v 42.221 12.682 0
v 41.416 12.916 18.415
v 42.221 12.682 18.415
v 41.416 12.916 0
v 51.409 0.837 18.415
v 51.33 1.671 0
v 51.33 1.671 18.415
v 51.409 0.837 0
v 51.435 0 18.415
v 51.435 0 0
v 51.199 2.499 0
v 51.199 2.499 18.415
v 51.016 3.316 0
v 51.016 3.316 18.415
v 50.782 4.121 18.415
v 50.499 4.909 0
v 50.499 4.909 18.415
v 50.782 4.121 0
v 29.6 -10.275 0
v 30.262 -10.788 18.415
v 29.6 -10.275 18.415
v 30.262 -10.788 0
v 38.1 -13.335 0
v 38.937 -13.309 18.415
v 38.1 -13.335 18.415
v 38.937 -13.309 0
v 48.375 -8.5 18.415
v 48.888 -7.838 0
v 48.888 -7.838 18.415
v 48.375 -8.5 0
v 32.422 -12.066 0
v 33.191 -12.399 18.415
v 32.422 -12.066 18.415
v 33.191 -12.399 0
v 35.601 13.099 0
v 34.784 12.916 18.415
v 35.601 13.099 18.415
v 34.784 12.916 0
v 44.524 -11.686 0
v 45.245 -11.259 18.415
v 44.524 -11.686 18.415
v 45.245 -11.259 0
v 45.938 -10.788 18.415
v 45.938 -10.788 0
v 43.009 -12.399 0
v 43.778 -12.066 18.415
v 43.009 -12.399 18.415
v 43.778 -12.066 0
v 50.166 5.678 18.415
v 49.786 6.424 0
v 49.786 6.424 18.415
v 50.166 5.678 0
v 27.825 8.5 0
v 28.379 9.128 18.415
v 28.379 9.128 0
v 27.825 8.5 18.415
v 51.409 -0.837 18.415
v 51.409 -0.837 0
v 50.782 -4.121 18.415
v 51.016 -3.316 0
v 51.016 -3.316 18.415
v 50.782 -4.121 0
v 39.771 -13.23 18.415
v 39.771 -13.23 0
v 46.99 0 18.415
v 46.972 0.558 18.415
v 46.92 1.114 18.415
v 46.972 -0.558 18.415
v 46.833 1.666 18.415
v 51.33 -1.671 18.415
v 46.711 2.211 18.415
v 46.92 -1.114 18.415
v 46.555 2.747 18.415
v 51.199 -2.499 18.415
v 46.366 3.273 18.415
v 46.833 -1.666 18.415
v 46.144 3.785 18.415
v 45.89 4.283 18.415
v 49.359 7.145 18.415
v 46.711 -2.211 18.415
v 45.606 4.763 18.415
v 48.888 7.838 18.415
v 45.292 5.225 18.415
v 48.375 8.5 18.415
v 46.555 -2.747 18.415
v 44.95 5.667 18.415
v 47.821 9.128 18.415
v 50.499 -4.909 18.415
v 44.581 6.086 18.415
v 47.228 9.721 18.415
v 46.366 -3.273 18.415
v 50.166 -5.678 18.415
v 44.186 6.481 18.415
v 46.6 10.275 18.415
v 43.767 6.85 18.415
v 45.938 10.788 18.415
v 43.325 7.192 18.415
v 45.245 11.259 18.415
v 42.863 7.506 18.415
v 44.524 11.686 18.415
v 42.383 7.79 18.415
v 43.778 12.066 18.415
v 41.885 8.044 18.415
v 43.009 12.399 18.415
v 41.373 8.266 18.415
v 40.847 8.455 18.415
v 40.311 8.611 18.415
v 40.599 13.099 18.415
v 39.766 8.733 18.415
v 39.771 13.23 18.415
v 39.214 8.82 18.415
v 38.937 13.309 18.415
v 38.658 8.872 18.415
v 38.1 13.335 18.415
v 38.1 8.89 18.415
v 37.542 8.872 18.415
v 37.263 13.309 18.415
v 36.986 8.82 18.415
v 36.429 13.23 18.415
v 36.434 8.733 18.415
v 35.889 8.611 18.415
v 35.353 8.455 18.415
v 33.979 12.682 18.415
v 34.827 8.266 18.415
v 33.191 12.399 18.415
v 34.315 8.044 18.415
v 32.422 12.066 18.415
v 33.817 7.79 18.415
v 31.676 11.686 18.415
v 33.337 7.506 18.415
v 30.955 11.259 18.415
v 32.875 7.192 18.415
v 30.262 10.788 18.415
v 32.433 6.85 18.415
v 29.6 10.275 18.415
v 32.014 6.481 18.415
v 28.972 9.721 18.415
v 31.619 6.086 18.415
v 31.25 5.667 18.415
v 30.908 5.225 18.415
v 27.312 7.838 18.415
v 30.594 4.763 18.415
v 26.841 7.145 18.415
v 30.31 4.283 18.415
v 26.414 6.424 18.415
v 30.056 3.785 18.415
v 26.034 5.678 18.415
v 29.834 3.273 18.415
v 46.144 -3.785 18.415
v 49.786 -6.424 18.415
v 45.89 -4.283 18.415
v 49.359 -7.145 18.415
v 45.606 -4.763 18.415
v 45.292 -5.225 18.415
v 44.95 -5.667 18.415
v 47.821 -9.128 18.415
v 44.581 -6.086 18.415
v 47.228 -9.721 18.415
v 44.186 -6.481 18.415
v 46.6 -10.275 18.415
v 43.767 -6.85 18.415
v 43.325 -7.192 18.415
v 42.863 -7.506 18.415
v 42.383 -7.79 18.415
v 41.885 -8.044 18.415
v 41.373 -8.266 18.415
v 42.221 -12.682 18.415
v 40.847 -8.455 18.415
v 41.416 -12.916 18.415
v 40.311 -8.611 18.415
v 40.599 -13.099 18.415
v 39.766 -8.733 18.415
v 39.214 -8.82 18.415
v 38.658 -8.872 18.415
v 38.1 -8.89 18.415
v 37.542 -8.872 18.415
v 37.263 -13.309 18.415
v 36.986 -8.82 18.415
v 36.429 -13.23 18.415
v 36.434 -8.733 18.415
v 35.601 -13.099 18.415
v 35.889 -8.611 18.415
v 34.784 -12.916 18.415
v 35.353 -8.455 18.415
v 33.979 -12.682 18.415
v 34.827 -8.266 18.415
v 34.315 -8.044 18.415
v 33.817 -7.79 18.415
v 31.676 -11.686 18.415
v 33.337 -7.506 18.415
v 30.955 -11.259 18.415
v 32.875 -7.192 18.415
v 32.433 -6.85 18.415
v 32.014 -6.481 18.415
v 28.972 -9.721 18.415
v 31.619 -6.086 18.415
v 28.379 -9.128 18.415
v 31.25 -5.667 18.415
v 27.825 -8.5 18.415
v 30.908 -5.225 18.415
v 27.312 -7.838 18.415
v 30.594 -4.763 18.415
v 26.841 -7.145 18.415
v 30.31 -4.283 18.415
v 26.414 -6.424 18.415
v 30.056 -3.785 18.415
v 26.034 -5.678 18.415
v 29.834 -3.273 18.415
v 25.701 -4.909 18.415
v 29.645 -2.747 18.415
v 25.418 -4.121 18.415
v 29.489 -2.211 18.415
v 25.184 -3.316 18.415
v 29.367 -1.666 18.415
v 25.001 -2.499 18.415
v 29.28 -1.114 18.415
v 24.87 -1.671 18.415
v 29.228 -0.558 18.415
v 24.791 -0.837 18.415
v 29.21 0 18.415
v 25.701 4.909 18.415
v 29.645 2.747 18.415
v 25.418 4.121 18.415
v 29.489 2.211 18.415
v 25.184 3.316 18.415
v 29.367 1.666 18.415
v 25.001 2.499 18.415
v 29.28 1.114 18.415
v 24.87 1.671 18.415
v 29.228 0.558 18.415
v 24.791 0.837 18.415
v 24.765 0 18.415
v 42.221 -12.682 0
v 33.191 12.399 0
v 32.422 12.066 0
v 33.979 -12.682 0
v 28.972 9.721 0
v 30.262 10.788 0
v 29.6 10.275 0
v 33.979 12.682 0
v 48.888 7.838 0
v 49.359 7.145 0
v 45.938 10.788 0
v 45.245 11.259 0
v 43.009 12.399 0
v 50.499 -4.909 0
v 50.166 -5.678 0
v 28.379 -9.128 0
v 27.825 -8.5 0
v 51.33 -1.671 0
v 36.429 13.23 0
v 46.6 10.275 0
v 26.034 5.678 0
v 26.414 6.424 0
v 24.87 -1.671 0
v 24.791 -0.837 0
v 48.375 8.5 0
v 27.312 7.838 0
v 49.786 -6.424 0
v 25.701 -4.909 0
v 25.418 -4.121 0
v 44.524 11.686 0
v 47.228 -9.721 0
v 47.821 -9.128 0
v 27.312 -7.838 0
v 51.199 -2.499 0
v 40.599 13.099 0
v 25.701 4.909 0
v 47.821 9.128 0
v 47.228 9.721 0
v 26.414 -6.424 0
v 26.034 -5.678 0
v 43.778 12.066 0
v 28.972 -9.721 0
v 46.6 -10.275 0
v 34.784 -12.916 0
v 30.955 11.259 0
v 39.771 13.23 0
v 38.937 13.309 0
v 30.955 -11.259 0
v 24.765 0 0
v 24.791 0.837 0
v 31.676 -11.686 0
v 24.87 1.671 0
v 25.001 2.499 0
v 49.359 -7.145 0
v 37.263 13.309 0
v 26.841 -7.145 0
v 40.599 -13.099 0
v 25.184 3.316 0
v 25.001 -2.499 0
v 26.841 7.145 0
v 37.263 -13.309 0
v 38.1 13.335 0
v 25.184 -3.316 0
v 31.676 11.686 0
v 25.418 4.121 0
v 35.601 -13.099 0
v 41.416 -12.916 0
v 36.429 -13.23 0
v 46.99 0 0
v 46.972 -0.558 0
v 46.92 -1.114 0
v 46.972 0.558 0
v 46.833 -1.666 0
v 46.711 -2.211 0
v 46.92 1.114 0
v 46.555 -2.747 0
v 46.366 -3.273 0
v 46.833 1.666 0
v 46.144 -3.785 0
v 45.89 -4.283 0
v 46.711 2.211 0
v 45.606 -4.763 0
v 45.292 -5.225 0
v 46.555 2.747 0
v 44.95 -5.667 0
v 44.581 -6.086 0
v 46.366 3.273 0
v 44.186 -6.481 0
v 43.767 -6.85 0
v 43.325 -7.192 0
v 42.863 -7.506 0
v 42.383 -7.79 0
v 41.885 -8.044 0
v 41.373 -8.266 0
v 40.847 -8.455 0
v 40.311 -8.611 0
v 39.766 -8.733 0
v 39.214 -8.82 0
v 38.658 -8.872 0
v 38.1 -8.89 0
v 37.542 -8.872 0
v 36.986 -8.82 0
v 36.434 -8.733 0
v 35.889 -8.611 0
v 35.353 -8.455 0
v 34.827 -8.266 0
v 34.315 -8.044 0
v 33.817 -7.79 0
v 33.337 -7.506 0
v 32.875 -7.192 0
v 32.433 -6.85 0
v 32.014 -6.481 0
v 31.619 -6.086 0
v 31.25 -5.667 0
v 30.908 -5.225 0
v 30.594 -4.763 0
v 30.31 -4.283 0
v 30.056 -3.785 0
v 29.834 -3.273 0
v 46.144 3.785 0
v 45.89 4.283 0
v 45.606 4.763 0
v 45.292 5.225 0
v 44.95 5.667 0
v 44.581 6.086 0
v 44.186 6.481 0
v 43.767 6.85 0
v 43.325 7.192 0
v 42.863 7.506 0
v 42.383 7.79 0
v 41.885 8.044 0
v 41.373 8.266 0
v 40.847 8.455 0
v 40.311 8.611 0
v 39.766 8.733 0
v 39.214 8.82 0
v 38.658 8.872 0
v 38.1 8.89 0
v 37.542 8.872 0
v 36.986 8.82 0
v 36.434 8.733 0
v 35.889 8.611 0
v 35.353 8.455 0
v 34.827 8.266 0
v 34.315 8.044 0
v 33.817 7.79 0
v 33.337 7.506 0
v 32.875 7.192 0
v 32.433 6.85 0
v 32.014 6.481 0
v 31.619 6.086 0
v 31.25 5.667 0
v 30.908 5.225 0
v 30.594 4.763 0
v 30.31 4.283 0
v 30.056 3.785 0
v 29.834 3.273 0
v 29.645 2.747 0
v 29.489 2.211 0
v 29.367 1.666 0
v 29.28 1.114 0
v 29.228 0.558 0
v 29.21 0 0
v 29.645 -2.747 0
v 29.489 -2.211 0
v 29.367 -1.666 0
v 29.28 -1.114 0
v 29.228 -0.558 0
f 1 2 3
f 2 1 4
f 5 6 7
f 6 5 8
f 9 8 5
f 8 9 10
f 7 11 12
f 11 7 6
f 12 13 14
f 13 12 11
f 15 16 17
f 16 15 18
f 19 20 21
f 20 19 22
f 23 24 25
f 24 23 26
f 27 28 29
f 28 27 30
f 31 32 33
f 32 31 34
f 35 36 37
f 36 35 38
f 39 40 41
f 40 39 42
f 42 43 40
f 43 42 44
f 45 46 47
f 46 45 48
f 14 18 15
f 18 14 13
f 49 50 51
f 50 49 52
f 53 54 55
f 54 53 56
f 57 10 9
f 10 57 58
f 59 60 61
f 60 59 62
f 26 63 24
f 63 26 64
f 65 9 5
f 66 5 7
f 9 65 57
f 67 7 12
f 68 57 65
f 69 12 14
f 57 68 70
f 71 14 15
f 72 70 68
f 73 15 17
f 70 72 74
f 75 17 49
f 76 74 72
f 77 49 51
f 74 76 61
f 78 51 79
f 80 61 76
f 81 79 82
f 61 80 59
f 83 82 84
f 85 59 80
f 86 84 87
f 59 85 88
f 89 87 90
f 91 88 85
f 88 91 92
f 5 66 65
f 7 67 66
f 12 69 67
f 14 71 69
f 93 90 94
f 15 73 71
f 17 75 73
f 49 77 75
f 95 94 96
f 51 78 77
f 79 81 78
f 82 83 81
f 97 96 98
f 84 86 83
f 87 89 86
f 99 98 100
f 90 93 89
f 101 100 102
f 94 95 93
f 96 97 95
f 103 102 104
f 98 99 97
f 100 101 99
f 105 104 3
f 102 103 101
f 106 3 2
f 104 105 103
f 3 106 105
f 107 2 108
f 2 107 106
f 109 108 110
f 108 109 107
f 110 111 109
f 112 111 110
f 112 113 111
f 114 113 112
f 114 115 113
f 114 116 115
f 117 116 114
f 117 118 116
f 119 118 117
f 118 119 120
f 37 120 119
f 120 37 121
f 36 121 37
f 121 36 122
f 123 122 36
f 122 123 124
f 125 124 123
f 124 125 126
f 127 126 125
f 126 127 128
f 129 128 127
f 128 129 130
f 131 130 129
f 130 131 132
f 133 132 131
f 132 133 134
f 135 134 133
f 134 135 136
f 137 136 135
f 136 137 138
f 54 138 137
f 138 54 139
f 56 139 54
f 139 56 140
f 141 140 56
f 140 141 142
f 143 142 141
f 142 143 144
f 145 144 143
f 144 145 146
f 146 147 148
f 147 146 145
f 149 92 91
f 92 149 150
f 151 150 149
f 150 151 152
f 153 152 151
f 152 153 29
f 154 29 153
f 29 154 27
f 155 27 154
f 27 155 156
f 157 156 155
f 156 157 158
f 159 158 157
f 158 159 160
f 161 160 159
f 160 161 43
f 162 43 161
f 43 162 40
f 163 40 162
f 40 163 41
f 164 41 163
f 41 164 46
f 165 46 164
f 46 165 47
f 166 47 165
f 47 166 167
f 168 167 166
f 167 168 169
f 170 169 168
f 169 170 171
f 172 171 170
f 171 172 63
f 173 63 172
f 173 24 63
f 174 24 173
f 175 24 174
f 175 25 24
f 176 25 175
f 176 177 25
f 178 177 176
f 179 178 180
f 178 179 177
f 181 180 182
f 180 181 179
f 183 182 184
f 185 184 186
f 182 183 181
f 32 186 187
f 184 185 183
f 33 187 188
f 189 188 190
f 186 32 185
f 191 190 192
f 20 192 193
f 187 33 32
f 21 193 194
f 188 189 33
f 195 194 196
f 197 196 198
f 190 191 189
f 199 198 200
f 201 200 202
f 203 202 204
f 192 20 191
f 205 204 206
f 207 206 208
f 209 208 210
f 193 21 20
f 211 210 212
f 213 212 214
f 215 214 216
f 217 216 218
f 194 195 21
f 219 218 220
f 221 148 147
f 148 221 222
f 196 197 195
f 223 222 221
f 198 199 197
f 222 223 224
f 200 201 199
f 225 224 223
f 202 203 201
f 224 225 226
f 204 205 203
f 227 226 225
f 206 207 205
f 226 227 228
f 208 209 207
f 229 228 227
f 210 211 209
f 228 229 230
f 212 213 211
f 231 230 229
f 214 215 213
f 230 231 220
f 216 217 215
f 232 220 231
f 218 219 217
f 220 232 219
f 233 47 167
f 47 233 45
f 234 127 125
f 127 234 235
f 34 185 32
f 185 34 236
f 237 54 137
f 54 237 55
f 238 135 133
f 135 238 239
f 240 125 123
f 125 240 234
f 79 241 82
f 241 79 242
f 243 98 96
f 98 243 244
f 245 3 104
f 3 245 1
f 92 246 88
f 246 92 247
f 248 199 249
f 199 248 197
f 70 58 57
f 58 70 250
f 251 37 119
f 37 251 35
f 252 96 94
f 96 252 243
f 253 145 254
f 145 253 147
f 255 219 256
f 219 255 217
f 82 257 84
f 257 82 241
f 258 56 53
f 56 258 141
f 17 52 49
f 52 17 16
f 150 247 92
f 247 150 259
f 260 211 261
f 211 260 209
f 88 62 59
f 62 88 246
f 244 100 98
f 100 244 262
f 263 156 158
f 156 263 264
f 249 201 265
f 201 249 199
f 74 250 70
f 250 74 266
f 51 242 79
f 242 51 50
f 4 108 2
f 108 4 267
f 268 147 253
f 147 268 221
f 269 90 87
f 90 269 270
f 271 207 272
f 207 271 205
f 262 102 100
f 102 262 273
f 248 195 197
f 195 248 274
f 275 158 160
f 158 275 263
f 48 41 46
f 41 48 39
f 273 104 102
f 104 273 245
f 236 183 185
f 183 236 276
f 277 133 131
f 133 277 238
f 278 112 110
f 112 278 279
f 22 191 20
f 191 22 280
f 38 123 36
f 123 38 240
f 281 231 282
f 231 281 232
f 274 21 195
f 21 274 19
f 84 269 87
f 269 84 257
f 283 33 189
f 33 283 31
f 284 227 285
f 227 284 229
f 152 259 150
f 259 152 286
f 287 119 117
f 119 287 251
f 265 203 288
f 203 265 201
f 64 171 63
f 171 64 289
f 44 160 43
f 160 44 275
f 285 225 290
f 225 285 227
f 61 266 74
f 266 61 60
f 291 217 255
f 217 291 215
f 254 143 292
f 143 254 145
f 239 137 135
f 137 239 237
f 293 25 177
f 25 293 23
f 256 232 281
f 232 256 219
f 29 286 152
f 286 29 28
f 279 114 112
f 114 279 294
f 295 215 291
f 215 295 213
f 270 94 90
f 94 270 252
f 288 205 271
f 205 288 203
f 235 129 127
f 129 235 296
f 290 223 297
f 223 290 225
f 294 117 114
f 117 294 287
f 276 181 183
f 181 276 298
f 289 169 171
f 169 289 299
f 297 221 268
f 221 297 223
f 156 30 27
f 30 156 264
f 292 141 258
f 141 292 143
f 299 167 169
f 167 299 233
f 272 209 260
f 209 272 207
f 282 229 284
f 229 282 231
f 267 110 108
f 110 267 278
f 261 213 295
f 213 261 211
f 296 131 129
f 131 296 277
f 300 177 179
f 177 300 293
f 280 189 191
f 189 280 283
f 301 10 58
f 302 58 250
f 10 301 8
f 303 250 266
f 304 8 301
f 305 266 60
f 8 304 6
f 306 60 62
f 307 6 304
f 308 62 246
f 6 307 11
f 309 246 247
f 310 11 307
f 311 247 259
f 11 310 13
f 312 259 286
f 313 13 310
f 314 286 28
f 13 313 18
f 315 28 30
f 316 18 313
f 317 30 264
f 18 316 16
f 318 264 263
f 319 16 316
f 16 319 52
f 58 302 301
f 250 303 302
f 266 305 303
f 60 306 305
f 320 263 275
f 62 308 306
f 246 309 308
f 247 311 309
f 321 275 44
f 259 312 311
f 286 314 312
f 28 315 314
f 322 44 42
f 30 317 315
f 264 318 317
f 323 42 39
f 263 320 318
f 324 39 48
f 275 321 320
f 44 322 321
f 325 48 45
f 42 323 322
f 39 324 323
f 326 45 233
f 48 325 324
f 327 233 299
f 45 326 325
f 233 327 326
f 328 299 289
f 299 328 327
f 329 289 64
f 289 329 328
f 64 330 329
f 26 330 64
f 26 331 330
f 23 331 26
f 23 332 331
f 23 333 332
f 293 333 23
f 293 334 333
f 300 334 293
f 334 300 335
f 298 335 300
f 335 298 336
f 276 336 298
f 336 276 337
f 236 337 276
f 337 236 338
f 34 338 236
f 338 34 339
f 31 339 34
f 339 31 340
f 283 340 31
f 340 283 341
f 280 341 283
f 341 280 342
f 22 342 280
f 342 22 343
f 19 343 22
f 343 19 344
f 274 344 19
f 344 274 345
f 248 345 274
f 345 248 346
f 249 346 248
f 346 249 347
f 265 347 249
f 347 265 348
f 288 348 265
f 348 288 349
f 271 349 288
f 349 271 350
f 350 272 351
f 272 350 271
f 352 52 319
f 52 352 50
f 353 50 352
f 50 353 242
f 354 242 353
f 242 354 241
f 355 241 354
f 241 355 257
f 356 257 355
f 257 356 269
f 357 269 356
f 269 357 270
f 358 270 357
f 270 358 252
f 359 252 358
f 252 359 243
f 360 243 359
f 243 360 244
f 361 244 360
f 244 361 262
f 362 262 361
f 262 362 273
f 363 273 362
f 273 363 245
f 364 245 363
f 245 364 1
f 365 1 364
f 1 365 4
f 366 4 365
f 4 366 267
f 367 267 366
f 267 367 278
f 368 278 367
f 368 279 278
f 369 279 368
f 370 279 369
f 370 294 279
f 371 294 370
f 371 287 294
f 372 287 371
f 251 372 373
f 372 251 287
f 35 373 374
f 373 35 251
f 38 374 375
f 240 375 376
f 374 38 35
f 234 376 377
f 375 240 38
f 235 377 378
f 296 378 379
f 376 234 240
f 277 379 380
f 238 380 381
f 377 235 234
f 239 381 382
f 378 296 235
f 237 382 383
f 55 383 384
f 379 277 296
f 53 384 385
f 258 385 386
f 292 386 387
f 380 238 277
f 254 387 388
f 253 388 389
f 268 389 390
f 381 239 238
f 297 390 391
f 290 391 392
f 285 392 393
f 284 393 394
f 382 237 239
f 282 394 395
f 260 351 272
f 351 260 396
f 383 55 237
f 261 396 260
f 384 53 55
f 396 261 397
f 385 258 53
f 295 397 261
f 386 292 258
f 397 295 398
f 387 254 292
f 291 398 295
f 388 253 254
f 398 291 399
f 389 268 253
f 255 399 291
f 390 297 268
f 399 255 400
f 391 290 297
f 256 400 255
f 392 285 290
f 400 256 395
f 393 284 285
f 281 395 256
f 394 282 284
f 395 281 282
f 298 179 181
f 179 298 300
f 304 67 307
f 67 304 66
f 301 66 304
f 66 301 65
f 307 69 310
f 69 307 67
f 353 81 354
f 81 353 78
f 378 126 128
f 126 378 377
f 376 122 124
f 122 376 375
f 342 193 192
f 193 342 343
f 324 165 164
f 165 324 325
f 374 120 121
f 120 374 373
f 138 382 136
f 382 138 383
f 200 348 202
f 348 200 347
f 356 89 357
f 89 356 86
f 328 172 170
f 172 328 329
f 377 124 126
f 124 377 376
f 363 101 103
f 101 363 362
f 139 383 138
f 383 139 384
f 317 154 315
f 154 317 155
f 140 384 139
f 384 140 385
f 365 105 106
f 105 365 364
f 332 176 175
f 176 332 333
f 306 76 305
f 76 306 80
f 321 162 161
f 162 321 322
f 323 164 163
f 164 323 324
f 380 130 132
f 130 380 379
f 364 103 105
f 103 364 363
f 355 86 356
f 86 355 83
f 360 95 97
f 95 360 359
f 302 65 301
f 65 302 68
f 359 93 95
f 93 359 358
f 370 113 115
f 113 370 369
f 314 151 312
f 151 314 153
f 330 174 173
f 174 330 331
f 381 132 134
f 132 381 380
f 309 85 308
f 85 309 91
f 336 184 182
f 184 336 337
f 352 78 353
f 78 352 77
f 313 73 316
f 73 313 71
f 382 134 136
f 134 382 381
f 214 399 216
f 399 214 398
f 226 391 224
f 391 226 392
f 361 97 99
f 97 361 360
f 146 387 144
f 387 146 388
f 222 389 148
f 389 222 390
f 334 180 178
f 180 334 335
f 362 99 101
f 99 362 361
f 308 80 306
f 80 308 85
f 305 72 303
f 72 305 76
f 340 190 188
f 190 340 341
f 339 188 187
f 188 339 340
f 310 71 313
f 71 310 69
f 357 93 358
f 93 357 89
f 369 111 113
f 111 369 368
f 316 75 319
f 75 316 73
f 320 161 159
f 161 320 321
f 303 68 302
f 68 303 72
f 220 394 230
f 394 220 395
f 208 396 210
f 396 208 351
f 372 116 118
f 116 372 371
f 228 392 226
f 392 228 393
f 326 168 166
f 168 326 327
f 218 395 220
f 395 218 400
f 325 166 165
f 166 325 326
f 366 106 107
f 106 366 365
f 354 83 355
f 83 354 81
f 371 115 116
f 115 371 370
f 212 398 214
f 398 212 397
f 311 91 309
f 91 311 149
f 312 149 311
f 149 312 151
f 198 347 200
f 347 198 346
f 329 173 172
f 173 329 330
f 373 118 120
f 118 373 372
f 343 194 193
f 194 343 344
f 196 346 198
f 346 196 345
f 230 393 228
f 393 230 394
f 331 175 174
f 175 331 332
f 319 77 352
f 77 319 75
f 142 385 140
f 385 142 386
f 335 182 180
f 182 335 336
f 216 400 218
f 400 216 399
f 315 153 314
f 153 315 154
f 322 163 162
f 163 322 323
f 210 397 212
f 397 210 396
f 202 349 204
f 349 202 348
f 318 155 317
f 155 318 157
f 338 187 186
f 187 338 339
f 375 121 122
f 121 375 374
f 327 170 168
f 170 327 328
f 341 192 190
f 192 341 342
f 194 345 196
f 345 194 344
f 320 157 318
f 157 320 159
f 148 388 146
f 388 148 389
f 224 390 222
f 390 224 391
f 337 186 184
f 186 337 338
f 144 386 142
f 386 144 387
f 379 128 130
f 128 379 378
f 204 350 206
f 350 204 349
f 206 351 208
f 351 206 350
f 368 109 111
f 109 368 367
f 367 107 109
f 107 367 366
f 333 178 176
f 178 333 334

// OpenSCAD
include <tsmthread4.scad>

$fn=100;

od_3_4=1.05;

if(0)
imperial() {
    translate([0,0,.725]) {
    difference() {
        union() {
            thread_npt(DMAJ=od_3_4+$OD_COMP, PITCH=0.07143, L=0.07143*8);
        }
        
        cylinder(d=3/4, h=2);
    }

    translate([0,0,-.725]) 
    difference() {
        cylinder(d=od_3_4,h=.725);
        translate([0,0,-.01])
            cylinder(d=3/4,h=.725+.1);
    }
    }
}

flex_od=.7;
imperial() {
translate([1.5,0,0])
    difference() {
        cylinder(d=od_3_4,h=.725);
        translate([0,0,-.01])
            cylinder(d=flex_od,h=.725+.1);
    }
}
